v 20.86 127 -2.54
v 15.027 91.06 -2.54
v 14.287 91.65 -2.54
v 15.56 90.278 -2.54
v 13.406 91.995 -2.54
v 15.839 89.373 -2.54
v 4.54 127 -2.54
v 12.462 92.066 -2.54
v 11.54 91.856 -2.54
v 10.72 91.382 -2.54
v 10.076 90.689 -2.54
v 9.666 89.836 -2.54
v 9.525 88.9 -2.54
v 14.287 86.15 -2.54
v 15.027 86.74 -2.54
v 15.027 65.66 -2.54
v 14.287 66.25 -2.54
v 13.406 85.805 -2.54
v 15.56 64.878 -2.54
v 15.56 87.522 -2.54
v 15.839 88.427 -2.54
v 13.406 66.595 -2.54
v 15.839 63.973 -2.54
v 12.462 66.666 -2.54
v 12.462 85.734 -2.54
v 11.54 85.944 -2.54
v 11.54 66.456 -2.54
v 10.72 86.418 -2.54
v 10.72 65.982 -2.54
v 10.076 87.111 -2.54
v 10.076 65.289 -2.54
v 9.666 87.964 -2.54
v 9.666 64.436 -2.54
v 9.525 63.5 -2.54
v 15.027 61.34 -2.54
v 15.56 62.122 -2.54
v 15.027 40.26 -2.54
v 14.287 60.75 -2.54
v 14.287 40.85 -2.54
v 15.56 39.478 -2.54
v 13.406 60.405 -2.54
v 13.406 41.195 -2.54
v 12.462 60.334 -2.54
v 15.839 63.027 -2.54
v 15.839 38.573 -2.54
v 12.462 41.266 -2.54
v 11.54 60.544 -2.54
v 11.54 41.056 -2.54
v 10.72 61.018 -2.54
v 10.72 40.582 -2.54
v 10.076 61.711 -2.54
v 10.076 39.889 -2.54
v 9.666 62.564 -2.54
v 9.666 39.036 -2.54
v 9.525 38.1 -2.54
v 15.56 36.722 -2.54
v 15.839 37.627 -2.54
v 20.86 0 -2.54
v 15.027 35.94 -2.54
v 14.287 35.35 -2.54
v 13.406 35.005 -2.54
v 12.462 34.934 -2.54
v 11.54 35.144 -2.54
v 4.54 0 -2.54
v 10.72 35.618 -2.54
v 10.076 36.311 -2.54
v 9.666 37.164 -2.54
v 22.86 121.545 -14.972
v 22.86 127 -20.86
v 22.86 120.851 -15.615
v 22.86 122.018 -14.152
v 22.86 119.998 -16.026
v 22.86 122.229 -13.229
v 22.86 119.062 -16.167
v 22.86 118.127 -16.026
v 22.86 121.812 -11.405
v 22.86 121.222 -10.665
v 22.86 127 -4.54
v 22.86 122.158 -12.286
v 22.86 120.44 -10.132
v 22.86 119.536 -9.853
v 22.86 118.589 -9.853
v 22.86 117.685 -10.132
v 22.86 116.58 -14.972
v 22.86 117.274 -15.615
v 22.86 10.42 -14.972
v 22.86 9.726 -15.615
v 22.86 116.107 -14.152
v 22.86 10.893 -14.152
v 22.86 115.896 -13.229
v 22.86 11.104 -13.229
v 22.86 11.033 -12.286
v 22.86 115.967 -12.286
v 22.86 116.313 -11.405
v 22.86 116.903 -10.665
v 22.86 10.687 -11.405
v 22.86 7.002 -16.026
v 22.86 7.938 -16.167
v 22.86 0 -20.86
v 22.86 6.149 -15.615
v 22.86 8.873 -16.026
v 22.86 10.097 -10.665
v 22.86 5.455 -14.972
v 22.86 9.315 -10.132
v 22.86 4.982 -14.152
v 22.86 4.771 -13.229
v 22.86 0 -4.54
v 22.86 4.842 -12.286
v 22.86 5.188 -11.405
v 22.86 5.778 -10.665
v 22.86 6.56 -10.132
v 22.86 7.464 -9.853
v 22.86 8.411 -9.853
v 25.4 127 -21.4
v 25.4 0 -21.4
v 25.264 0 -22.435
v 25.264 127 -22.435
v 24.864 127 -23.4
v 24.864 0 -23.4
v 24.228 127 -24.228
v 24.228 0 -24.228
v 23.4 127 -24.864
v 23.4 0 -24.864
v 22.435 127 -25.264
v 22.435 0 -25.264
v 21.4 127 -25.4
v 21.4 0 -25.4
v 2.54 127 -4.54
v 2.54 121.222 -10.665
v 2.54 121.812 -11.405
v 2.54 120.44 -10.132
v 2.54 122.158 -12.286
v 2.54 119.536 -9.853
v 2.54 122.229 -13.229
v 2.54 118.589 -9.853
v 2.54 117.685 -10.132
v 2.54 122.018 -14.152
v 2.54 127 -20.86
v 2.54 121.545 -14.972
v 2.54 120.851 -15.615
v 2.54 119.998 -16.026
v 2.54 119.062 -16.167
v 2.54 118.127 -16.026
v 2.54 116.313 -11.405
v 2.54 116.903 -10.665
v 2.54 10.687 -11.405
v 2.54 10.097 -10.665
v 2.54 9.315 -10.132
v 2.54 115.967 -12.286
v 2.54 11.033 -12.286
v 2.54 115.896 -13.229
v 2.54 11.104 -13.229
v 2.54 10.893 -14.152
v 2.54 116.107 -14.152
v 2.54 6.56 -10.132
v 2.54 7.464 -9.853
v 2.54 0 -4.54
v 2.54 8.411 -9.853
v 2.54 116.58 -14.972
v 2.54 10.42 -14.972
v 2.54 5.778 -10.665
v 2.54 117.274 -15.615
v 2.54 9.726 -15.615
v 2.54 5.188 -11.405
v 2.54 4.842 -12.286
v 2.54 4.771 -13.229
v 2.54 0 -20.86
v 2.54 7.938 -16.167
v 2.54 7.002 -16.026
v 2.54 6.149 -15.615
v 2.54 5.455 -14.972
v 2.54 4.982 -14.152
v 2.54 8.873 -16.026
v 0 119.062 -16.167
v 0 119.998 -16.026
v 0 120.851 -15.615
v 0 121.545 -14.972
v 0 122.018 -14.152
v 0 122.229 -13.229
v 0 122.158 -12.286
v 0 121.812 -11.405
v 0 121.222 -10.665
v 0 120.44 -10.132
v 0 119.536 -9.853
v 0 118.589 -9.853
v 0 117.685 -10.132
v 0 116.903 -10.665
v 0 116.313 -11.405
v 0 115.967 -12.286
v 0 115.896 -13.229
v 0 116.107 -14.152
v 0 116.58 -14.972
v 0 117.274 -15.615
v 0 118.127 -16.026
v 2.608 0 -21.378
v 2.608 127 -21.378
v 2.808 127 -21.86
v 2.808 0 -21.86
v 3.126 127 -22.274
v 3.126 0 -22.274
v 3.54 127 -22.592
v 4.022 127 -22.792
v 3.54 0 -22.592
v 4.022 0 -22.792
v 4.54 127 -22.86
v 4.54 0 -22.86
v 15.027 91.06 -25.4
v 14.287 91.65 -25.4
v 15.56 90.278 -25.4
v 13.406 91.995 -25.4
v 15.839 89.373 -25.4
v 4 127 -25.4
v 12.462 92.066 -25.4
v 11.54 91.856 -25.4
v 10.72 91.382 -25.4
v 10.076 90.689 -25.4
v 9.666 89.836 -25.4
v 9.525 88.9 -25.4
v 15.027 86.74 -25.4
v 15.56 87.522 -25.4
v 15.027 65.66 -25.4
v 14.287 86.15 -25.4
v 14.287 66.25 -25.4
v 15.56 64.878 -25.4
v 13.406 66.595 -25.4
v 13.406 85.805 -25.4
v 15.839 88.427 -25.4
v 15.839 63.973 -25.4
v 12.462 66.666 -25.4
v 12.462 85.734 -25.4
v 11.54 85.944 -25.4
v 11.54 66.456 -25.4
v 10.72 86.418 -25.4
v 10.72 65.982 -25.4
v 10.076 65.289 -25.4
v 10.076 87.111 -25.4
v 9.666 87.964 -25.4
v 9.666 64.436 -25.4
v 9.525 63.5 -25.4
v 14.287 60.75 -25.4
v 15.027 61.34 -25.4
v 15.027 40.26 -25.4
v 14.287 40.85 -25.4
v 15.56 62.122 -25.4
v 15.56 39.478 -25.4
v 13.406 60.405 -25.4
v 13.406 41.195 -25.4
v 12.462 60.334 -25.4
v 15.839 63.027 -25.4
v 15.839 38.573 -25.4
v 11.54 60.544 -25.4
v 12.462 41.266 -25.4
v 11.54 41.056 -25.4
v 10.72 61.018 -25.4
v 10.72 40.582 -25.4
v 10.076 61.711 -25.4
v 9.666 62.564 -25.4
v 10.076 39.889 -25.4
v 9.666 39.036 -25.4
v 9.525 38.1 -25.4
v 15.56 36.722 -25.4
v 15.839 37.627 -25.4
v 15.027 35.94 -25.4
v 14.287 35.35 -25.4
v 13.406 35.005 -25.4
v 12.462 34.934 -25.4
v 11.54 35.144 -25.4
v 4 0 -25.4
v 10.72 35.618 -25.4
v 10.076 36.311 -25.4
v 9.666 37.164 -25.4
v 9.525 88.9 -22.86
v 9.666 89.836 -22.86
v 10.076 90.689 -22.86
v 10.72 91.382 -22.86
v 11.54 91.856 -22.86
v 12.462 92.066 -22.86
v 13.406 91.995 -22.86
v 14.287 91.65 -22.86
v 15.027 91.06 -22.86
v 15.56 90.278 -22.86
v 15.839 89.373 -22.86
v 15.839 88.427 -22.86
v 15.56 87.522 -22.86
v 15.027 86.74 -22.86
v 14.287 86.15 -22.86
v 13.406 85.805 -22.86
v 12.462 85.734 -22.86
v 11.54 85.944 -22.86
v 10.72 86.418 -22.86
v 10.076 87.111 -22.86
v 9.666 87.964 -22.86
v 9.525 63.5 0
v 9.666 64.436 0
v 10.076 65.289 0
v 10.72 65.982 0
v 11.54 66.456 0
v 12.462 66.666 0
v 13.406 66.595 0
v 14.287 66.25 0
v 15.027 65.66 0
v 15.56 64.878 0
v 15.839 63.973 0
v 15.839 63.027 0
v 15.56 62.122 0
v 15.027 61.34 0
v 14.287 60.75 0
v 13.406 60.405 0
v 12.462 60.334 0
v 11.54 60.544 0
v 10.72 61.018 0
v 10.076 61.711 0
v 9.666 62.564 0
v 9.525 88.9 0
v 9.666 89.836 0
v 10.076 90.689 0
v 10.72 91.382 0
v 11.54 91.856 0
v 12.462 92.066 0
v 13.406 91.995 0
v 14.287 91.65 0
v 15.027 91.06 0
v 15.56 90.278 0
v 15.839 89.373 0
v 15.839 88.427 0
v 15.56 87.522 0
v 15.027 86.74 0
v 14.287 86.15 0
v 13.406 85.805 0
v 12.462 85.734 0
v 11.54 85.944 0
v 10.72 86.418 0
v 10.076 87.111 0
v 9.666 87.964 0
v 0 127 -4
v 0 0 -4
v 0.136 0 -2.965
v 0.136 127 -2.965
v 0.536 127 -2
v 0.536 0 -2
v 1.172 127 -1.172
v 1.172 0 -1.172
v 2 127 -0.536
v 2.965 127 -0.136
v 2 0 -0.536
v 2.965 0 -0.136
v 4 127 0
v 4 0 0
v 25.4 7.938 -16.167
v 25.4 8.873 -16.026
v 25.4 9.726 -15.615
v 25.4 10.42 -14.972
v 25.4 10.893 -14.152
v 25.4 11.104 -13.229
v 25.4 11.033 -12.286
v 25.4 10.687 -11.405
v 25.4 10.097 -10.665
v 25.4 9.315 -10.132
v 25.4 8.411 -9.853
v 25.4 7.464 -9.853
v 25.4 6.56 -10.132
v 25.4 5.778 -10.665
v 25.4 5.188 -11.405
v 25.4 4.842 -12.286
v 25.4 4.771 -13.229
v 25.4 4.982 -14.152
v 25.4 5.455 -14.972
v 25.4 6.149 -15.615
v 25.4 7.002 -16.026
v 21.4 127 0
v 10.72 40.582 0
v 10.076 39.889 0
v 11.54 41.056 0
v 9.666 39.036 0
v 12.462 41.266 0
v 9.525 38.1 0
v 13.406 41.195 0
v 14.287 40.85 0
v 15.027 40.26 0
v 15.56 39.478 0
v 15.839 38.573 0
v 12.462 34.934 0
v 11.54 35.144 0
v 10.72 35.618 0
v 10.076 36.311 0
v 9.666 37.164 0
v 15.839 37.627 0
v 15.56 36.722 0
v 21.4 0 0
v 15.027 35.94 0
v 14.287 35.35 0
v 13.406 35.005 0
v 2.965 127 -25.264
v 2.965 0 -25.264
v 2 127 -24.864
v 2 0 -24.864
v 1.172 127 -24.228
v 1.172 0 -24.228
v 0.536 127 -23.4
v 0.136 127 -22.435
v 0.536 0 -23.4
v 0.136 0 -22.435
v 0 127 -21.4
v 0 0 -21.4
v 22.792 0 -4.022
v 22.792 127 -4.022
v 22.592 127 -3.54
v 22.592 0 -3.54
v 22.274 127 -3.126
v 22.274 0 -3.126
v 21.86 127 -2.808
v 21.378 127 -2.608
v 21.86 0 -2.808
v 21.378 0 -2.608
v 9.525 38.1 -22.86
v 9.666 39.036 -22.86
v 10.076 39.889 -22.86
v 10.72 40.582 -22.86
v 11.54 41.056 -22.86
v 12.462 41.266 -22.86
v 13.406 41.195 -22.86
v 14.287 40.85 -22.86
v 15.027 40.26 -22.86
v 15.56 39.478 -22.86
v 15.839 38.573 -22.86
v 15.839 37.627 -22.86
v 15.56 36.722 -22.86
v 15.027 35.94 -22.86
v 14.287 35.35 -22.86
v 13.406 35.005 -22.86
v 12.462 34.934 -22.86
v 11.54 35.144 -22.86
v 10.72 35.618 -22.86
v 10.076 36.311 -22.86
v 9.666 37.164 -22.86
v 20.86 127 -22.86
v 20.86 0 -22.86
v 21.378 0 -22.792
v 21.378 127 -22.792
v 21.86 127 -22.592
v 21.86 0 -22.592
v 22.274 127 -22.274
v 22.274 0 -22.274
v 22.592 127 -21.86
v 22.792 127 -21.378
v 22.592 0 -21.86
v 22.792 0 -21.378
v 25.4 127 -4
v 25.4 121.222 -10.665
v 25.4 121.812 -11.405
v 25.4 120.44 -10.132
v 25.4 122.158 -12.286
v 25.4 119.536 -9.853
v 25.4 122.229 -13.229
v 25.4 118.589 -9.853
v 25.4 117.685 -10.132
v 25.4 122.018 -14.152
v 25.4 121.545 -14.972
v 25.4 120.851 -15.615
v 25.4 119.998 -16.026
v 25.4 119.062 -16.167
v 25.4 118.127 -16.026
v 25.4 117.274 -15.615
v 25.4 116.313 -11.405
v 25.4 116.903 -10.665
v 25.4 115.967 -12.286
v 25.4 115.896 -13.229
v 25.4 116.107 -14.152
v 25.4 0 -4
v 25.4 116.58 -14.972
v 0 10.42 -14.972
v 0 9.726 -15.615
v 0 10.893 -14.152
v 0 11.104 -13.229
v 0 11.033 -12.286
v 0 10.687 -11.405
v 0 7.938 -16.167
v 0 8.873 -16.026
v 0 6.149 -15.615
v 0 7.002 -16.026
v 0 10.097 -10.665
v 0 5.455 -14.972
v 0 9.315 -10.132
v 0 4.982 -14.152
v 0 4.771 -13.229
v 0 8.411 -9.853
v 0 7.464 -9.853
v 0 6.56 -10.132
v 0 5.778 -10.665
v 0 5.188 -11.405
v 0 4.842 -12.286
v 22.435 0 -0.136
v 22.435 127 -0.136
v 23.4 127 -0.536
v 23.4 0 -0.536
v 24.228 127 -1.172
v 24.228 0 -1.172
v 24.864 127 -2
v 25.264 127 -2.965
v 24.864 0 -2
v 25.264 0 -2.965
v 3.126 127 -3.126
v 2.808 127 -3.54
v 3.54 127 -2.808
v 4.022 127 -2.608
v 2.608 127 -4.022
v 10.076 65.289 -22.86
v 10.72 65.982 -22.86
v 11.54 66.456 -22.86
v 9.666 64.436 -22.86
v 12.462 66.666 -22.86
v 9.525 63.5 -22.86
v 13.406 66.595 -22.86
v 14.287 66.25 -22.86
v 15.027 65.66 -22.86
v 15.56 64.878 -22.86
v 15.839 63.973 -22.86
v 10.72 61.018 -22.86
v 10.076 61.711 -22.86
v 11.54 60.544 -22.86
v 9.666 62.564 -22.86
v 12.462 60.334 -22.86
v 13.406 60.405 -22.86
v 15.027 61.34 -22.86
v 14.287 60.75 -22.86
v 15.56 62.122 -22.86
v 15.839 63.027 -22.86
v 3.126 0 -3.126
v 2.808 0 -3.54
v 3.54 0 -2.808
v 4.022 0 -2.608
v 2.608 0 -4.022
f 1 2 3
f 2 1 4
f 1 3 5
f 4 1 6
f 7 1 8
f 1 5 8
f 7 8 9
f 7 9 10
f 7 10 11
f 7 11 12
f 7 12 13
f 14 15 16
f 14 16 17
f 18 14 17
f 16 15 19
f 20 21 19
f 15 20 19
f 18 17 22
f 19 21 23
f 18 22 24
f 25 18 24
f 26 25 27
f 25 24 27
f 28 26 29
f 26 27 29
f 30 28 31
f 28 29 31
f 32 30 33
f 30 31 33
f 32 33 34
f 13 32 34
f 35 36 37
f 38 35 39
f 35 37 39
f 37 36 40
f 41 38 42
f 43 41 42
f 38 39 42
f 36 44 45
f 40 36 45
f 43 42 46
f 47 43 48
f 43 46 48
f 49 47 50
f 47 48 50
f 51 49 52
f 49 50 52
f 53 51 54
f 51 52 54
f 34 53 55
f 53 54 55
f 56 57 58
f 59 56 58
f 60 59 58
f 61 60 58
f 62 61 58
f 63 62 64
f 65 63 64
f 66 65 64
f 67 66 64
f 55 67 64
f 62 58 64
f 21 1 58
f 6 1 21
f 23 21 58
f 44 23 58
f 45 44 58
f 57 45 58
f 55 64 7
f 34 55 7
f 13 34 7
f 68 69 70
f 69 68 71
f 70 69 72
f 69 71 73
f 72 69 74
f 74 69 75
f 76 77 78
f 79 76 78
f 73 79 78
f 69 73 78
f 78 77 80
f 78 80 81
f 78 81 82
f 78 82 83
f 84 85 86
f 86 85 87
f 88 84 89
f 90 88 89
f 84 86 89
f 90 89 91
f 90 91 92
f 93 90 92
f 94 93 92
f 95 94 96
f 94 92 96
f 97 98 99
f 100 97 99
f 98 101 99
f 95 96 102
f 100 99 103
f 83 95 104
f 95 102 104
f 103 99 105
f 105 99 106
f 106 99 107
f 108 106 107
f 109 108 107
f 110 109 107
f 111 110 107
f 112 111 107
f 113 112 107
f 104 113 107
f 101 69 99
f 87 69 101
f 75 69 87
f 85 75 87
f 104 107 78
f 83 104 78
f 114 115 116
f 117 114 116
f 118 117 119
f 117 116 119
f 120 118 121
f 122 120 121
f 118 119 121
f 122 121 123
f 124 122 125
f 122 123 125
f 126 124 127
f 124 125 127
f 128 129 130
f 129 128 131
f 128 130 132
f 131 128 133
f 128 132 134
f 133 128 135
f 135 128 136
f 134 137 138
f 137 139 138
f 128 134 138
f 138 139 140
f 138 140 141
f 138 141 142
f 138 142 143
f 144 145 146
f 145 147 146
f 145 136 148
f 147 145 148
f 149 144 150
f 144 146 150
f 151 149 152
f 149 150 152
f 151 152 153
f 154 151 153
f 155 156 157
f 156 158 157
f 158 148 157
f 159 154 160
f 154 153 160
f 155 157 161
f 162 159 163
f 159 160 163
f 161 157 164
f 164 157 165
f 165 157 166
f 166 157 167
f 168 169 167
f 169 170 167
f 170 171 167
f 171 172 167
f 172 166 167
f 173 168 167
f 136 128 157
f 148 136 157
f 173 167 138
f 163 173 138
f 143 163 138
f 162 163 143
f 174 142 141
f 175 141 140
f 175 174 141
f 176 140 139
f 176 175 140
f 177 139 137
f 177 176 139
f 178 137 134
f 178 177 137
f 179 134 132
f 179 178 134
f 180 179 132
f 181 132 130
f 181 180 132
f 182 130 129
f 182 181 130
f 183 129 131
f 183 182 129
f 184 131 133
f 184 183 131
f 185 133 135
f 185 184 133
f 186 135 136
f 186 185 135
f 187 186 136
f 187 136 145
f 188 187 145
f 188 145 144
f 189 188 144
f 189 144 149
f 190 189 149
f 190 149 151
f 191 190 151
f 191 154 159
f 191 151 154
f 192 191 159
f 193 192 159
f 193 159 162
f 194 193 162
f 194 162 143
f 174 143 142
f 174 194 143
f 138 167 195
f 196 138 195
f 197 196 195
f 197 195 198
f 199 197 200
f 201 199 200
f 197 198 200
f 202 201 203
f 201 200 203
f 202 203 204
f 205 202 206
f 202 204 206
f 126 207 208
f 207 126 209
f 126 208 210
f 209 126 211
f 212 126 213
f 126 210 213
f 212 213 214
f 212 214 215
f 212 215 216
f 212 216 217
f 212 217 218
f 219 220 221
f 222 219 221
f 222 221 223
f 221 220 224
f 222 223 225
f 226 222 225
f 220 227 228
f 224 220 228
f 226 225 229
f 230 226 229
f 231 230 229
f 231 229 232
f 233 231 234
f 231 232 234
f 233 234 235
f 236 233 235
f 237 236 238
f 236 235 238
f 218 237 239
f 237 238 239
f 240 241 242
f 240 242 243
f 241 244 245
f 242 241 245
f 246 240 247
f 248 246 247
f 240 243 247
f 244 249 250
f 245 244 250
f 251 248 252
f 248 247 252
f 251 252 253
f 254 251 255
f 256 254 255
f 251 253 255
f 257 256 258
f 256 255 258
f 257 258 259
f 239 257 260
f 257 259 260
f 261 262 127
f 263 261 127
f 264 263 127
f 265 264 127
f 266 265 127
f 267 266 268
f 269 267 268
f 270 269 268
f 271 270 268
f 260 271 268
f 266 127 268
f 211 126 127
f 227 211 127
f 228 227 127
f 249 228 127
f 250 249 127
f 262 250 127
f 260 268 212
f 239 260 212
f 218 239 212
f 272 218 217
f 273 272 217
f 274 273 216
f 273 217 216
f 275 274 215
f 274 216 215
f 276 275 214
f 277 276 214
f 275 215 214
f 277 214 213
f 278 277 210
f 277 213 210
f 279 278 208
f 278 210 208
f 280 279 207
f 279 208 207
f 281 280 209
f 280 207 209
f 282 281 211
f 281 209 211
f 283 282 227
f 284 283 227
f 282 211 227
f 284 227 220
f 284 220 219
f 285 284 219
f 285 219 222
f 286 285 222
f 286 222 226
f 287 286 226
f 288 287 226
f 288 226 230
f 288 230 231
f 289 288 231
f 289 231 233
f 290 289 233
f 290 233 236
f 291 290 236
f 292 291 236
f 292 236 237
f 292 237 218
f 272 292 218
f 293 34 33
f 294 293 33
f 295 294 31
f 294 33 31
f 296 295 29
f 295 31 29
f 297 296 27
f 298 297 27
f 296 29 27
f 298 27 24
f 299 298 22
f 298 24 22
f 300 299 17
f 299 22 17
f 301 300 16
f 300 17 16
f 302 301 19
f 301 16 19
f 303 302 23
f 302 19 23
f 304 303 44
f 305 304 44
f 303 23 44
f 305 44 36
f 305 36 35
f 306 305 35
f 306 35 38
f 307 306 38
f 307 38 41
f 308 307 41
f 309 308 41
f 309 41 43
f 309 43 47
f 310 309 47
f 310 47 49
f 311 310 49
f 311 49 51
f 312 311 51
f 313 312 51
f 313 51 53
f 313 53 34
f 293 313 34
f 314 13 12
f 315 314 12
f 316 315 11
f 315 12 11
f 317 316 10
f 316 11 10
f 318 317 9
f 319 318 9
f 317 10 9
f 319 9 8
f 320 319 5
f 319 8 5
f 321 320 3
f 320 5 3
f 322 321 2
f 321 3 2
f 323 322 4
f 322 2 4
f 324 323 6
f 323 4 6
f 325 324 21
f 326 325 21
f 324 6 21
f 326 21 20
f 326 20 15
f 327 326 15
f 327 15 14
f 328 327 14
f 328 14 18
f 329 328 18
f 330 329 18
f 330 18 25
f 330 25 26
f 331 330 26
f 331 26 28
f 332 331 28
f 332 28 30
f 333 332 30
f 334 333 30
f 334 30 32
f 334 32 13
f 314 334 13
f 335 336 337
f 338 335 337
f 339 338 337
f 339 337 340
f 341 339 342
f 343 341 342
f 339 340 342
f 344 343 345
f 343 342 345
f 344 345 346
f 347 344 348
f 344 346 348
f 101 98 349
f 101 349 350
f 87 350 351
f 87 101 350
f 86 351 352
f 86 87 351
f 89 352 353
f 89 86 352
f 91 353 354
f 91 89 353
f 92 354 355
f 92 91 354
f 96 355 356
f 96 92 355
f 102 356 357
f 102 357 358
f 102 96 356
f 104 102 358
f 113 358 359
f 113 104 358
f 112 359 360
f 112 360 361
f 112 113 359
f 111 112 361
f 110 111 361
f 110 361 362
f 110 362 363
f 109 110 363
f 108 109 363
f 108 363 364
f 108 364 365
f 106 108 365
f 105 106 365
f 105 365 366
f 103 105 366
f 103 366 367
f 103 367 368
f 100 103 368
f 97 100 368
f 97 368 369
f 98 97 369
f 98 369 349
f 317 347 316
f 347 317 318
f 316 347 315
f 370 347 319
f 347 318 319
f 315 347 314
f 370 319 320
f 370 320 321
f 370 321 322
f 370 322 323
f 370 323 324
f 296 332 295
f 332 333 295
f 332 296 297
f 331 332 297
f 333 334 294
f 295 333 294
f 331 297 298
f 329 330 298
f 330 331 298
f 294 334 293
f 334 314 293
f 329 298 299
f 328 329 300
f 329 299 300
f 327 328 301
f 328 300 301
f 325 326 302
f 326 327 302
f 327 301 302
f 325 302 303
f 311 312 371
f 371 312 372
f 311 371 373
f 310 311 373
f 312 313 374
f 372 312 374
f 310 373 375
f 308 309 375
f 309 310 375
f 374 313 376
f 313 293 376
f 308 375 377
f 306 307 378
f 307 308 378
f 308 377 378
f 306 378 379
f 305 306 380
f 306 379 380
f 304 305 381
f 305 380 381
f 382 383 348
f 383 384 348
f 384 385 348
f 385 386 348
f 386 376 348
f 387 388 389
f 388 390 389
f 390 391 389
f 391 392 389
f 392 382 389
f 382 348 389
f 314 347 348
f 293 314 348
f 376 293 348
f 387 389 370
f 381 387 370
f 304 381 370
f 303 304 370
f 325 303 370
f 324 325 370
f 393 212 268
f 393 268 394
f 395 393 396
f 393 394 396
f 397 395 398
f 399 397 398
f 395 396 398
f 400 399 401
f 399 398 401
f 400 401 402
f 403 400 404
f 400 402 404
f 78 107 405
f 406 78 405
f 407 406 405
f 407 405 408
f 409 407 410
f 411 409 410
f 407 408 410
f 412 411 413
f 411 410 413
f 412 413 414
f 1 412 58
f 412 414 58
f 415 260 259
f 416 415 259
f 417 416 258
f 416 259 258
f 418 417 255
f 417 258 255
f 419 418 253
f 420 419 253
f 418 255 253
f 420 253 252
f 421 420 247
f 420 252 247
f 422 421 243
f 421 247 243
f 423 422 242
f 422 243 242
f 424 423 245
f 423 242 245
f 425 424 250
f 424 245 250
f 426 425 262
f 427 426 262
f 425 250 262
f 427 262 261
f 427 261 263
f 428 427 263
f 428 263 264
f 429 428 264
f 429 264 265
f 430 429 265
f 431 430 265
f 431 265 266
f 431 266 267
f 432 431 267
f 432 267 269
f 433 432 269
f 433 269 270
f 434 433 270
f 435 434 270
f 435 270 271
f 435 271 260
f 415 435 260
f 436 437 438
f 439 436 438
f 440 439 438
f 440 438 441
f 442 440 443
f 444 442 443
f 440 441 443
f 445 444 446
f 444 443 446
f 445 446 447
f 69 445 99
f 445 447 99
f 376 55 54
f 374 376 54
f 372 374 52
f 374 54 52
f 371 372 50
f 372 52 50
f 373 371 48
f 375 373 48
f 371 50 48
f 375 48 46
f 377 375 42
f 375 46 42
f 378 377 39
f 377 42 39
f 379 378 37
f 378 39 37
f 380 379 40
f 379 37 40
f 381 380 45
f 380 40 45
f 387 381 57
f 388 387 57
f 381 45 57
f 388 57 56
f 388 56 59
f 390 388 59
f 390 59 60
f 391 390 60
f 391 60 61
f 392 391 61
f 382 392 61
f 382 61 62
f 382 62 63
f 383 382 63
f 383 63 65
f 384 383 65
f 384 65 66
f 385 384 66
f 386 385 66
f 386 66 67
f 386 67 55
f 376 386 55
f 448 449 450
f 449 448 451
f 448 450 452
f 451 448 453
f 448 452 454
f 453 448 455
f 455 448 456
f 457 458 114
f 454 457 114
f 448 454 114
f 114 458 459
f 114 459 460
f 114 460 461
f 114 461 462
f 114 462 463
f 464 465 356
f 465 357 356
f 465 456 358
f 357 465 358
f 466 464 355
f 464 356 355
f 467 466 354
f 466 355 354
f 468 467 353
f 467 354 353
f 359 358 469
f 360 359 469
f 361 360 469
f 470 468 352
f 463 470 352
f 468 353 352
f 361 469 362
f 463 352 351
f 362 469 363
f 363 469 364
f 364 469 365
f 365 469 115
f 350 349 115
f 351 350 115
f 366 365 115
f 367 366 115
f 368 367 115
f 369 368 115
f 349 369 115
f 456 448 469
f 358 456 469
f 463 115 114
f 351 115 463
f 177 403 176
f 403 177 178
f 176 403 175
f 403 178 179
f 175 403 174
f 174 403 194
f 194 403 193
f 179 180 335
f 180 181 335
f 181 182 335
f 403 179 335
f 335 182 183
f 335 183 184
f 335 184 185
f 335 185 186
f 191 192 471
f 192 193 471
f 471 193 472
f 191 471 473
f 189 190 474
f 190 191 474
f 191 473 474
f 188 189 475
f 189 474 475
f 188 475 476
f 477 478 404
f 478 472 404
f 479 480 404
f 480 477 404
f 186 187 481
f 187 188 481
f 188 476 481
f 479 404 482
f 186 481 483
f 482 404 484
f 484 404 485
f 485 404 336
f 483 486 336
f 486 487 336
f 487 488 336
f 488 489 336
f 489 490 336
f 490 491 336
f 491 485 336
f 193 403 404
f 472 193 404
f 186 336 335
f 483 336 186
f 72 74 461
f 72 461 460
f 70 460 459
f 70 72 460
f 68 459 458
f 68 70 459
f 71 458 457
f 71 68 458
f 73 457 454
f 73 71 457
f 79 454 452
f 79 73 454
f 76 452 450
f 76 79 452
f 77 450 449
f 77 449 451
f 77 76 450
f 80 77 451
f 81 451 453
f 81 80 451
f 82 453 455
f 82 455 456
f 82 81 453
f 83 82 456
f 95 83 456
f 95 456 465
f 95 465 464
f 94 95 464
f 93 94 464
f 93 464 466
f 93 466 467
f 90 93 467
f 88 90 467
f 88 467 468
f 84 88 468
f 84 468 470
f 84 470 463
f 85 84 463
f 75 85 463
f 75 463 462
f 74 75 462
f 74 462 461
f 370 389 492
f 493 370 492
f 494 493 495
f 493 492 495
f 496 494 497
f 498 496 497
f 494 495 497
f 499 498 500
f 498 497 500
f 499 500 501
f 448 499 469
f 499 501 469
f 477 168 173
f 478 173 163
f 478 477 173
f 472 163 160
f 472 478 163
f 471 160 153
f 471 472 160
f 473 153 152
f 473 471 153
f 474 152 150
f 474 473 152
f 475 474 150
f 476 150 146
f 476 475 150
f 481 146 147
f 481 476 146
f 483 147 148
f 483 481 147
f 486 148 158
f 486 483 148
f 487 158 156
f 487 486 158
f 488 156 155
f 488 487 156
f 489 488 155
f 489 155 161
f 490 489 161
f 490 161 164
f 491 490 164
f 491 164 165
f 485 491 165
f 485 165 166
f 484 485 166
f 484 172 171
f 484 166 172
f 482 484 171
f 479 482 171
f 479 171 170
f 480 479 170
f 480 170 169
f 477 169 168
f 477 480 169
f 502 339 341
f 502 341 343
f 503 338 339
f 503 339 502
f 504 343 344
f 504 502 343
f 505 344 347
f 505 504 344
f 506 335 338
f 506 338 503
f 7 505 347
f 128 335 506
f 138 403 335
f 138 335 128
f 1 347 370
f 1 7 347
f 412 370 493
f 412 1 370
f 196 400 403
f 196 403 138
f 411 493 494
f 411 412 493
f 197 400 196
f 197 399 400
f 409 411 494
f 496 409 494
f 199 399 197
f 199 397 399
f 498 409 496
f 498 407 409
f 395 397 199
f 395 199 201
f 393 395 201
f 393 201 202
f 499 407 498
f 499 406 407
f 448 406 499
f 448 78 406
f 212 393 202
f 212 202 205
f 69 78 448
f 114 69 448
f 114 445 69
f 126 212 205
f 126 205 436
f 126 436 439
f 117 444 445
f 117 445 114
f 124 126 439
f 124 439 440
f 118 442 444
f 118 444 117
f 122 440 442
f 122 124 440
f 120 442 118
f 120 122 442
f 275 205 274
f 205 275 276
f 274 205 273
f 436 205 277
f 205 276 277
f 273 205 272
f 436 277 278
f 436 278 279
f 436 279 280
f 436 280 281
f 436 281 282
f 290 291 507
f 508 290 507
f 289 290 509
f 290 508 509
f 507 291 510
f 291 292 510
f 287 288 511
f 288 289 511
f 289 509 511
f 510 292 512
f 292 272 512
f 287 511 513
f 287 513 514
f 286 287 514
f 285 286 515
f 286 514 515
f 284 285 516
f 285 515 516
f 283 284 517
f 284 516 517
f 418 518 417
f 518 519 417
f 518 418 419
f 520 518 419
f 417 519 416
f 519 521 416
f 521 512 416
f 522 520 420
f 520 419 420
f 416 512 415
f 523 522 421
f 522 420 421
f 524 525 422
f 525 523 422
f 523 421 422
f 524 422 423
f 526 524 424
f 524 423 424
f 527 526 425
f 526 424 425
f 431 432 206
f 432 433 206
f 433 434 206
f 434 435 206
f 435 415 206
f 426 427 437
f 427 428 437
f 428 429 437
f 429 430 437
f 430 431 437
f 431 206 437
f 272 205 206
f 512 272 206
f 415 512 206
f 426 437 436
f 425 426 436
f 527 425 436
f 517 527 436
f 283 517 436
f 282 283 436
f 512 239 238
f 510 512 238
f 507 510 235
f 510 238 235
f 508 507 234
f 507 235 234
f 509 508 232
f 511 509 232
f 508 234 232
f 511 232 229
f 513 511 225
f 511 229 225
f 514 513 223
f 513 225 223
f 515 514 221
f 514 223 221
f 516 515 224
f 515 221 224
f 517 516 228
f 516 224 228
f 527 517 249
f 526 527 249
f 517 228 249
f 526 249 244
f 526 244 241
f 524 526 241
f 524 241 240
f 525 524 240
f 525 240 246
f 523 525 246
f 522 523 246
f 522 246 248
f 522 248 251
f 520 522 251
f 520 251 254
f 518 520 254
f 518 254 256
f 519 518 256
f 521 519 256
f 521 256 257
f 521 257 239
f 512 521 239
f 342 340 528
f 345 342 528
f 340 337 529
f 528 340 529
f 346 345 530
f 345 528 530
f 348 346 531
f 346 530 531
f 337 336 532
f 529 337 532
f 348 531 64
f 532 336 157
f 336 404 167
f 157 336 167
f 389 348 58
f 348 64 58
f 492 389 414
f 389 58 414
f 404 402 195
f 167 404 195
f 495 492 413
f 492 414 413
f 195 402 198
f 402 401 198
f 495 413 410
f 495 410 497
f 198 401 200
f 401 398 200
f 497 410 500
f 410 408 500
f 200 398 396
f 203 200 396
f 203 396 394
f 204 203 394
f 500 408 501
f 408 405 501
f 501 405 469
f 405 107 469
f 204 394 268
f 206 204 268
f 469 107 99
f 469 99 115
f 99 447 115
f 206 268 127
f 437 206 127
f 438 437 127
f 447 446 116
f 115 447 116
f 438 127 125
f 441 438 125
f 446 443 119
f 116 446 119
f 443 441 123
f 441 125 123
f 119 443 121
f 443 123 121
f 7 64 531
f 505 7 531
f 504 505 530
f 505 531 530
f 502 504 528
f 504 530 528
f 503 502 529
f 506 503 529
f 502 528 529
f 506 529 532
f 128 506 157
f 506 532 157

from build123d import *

# Parameters (mm, degrees)
BOSS_EXTRUDE1_DEPTH     = 127
SKETCH2_R               = 3.175
CUT_EXTRUDE1_DEPTH      = 25.4
SKETCH3_R               = 3.175
CUT_EXTRUDE2_DEPTH      = 1
CUT_EXTRUDE2_DEPTH_BACK = 26.4


with BuildPart() as part:
    # Sketch1 → Boss-Extrude1 (new body)
    with BuildSketch(Plane(origin=(0, 0, 0), x_dir=(1, 0, 0), z_dir=(0, 1, 0))):
        with BuildLine():
            Line((4, 0), (21.4, 0))
            ThreePointArc((21.4, 0), (24.228427125, 1.171572875), (25.4, 4))
            Line((25.4, 4), (25.4, 21.4))
            ThreePointArc((25.4, 21.4), (24.228427125, 24.228427125), (21.4, 25.4))
            Line((21.4, 25.4), (4, 25.4))
            ThreePointArc((4, 25.4), (1.171572875, 24.228427125), (0, 21.4))
            Line((0, 21.4), (0, 4))
            ThreePointArc((0, 4), (1.171572875, 1.171572875), (4, 0))
        make_face()
        with BuildLine():
            Line((20.86, 2.54), (4.54, 2.54))
            ThreePointArc((4.54, 2.54), (3.125786438, 3.125786438), (2.54, 4.54))
            Line((2.54, 4.54), (2.54, 20.86))
            ThreePointArc((2.54, 20.86), (3.125786438, 22.274213562), (4.54, 22.86))
            Line((4.54, 22.86), (20.86, 22.86))
            ThreePointArc((20.86, 22.86), (22.274213562, 22.274213562), (22.86, 20.86))
            Line((22.86, 20.86), (22.86, 4.54))
            ThreePointArc((22.86, 4.54), (22.274213562, 3.125786438), (20.86, 2.54))
        make_face(mode=Mode.SUBTRACT)
    extrude(amount=BOSS_EXTRUDE1_DEPTH)

    # Sketch2 → Cut-Extrude1 (cut)
    with BuildSketch(Plane(origin=(0, 0, 0), x_dir=(0, 0, -1), z_dir=(1, 0, 0))):
        with Locations((12.9921, 7.9375)):
            Circle(SKETCH2_R)
        with Locations((12.9921, 119.0625)):
            Circle(SKETCH2_R)
    extrude(amount=CUT_EXTRUDE1_DEPTH, mode=Mode.SUBTRACT)

    # Sketch3 → Cut-Extrude2 (cut, two sides)
    with BuildSketch(Plane(origin=(0, 0, -25.4), x_dir=(-1, 0, 0), z_dir=(0, 0, -1))) as cut_extrude2_sk:
        with Locations((-12.699512574, 88.9)):
            Circle(SKETCH3_R)
        with Locations((-12.699512574, 63.5)):
            Circle(SKETCH3_R)
        with Locations((-12.699512574, 38.1)):
            Circle(SKETCH3_R)
    extrude(amount=CUT_EXTRUDE2_DEPTH, mode=Mode.SUBTRACT)
    extrude(cut_extrude2_sk.sketch, amount=-CUT_EXTRUDE2_DEPTH_BACK, mode=Mode.SUBTRACT)


solid = part.part
